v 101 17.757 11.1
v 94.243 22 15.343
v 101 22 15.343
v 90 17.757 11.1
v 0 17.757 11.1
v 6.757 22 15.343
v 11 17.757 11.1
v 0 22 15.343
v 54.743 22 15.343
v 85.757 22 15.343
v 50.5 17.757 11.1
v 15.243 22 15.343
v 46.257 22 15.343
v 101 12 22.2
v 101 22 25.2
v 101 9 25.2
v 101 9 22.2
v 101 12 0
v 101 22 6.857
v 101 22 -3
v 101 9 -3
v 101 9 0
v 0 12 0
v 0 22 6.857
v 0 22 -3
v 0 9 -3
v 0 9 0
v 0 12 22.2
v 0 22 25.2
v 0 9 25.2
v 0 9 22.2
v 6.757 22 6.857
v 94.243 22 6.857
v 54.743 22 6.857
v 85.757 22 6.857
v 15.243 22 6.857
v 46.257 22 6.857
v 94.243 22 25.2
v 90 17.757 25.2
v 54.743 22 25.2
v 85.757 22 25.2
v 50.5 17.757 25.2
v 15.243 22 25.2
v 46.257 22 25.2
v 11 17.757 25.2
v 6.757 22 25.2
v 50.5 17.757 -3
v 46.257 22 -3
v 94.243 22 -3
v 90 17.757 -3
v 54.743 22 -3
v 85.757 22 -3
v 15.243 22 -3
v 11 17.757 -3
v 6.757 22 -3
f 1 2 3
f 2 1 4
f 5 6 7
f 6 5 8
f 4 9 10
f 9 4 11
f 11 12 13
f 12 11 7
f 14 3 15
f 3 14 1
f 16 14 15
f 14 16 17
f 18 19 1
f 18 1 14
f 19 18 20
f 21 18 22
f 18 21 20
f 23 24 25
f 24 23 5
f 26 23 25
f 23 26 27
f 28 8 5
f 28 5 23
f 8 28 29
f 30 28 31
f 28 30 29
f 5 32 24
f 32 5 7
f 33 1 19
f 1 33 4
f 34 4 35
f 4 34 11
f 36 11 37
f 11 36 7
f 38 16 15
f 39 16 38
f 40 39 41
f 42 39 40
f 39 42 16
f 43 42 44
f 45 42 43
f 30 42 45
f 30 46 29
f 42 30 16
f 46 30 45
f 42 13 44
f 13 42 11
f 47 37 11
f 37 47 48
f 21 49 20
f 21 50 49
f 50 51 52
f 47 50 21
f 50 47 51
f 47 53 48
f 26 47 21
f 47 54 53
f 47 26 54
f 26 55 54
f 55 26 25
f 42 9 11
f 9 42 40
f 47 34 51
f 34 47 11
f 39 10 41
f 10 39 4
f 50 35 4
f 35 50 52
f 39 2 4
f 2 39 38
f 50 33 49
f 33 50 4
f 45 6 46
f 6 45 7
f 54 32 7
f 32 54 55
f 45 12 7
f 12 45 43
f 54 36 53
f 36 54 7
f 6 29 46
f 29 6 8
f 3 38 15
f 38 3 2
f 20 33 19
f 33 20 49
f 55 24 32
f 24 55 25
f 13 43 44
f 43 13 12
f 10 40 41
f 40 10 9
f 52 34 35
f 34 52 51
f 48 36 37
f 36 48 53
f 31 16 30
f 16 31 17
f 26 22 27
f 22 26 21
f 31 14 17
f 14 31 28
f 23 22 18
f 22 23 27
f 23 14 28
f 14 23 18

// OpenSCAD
/*
 * Vise Jaw Pads
 *
 * Author: Pavel Rampas
 * Version: 1.0.0 (Changelog is at the bottom)
 * License: CC BY-SA 4.0 [https://creativecommons.org/licenses/by-sa/4.0/]
 * Link: https://github.com/pavelrampas/openscad-models
 *
 * OpenSCAD version: 2021.01
 *
 * Instructions:
 * Set up parameters, render and print.
 *
 * Height is layer.
 * Thickness is perimeter.
 */

// Parameters
//------------------------------------------------------------------------------

$fn = $preview ? 15 : 90;

jawWidth = 101;
jawDepth = 12;
jawHeight = 22.2;

enableGroove = true;

// Parameters that don't need to be changed
//------------------------------------------------------------------------------

padDepth = 10;

grooveSize = 6;

holderThickness = 3;
holderHeight = 3;

// Code
//------------------------------------------------------------------------------

heightTotal = jawHeight + (2 * holderThickness);

difference() {
    // pad
    translate([0, jawDepth - holderHeight, -holderThickness]) {
        cube([
            jawWidth,
            padDepth + holderHeight,
            heightTotal
        ]);
    }

    // jaw
    #cube([jawWidth, jawDepth, jawHeight]);

    // grooves
    if(enableGroove) {
        translate([
            jawWidth / 2,
            padDepth + jawDepth,
            jawHeight / 2
        ]) {
            rotate([45, 0, 0]) {
                cube([jawWidth, grooveSize, grooveSize], true);
            }
        }

        translate([
            jawWidth / 2,
            padDepth + jawDepth,
            jawHeight / 2
        ]) {
            rotate([0, 0, 45]) {
                cube([grooveSize, grooveSize, heightTotal], true);
            }
        }

        translate([
            jawWidth - (grooveSize + 5),
            padDepth + jawDepth,
            jawHeight / 2
        ]) {
            rotate([0, 0, 45]) {
                cube([grooveSize, grooveSize, heightTotal], true);
            }
        }

        translate([
            grooveSize + 5,
            padDepth + jawDepth,
            jawHeight / 2
        ]) {
            rotate([0, 0, 45]) {
                cube([grooveSize, grooveSize, heightTotal], true);
            }
        }
    }
}

// Functions
//------------------------------------------------------------------------------

// Modules
//------------------------------------------------------------------------------

// Changelog
//------------------------------------------------------------------------------

// [1.0.0]:
// Initial release.
